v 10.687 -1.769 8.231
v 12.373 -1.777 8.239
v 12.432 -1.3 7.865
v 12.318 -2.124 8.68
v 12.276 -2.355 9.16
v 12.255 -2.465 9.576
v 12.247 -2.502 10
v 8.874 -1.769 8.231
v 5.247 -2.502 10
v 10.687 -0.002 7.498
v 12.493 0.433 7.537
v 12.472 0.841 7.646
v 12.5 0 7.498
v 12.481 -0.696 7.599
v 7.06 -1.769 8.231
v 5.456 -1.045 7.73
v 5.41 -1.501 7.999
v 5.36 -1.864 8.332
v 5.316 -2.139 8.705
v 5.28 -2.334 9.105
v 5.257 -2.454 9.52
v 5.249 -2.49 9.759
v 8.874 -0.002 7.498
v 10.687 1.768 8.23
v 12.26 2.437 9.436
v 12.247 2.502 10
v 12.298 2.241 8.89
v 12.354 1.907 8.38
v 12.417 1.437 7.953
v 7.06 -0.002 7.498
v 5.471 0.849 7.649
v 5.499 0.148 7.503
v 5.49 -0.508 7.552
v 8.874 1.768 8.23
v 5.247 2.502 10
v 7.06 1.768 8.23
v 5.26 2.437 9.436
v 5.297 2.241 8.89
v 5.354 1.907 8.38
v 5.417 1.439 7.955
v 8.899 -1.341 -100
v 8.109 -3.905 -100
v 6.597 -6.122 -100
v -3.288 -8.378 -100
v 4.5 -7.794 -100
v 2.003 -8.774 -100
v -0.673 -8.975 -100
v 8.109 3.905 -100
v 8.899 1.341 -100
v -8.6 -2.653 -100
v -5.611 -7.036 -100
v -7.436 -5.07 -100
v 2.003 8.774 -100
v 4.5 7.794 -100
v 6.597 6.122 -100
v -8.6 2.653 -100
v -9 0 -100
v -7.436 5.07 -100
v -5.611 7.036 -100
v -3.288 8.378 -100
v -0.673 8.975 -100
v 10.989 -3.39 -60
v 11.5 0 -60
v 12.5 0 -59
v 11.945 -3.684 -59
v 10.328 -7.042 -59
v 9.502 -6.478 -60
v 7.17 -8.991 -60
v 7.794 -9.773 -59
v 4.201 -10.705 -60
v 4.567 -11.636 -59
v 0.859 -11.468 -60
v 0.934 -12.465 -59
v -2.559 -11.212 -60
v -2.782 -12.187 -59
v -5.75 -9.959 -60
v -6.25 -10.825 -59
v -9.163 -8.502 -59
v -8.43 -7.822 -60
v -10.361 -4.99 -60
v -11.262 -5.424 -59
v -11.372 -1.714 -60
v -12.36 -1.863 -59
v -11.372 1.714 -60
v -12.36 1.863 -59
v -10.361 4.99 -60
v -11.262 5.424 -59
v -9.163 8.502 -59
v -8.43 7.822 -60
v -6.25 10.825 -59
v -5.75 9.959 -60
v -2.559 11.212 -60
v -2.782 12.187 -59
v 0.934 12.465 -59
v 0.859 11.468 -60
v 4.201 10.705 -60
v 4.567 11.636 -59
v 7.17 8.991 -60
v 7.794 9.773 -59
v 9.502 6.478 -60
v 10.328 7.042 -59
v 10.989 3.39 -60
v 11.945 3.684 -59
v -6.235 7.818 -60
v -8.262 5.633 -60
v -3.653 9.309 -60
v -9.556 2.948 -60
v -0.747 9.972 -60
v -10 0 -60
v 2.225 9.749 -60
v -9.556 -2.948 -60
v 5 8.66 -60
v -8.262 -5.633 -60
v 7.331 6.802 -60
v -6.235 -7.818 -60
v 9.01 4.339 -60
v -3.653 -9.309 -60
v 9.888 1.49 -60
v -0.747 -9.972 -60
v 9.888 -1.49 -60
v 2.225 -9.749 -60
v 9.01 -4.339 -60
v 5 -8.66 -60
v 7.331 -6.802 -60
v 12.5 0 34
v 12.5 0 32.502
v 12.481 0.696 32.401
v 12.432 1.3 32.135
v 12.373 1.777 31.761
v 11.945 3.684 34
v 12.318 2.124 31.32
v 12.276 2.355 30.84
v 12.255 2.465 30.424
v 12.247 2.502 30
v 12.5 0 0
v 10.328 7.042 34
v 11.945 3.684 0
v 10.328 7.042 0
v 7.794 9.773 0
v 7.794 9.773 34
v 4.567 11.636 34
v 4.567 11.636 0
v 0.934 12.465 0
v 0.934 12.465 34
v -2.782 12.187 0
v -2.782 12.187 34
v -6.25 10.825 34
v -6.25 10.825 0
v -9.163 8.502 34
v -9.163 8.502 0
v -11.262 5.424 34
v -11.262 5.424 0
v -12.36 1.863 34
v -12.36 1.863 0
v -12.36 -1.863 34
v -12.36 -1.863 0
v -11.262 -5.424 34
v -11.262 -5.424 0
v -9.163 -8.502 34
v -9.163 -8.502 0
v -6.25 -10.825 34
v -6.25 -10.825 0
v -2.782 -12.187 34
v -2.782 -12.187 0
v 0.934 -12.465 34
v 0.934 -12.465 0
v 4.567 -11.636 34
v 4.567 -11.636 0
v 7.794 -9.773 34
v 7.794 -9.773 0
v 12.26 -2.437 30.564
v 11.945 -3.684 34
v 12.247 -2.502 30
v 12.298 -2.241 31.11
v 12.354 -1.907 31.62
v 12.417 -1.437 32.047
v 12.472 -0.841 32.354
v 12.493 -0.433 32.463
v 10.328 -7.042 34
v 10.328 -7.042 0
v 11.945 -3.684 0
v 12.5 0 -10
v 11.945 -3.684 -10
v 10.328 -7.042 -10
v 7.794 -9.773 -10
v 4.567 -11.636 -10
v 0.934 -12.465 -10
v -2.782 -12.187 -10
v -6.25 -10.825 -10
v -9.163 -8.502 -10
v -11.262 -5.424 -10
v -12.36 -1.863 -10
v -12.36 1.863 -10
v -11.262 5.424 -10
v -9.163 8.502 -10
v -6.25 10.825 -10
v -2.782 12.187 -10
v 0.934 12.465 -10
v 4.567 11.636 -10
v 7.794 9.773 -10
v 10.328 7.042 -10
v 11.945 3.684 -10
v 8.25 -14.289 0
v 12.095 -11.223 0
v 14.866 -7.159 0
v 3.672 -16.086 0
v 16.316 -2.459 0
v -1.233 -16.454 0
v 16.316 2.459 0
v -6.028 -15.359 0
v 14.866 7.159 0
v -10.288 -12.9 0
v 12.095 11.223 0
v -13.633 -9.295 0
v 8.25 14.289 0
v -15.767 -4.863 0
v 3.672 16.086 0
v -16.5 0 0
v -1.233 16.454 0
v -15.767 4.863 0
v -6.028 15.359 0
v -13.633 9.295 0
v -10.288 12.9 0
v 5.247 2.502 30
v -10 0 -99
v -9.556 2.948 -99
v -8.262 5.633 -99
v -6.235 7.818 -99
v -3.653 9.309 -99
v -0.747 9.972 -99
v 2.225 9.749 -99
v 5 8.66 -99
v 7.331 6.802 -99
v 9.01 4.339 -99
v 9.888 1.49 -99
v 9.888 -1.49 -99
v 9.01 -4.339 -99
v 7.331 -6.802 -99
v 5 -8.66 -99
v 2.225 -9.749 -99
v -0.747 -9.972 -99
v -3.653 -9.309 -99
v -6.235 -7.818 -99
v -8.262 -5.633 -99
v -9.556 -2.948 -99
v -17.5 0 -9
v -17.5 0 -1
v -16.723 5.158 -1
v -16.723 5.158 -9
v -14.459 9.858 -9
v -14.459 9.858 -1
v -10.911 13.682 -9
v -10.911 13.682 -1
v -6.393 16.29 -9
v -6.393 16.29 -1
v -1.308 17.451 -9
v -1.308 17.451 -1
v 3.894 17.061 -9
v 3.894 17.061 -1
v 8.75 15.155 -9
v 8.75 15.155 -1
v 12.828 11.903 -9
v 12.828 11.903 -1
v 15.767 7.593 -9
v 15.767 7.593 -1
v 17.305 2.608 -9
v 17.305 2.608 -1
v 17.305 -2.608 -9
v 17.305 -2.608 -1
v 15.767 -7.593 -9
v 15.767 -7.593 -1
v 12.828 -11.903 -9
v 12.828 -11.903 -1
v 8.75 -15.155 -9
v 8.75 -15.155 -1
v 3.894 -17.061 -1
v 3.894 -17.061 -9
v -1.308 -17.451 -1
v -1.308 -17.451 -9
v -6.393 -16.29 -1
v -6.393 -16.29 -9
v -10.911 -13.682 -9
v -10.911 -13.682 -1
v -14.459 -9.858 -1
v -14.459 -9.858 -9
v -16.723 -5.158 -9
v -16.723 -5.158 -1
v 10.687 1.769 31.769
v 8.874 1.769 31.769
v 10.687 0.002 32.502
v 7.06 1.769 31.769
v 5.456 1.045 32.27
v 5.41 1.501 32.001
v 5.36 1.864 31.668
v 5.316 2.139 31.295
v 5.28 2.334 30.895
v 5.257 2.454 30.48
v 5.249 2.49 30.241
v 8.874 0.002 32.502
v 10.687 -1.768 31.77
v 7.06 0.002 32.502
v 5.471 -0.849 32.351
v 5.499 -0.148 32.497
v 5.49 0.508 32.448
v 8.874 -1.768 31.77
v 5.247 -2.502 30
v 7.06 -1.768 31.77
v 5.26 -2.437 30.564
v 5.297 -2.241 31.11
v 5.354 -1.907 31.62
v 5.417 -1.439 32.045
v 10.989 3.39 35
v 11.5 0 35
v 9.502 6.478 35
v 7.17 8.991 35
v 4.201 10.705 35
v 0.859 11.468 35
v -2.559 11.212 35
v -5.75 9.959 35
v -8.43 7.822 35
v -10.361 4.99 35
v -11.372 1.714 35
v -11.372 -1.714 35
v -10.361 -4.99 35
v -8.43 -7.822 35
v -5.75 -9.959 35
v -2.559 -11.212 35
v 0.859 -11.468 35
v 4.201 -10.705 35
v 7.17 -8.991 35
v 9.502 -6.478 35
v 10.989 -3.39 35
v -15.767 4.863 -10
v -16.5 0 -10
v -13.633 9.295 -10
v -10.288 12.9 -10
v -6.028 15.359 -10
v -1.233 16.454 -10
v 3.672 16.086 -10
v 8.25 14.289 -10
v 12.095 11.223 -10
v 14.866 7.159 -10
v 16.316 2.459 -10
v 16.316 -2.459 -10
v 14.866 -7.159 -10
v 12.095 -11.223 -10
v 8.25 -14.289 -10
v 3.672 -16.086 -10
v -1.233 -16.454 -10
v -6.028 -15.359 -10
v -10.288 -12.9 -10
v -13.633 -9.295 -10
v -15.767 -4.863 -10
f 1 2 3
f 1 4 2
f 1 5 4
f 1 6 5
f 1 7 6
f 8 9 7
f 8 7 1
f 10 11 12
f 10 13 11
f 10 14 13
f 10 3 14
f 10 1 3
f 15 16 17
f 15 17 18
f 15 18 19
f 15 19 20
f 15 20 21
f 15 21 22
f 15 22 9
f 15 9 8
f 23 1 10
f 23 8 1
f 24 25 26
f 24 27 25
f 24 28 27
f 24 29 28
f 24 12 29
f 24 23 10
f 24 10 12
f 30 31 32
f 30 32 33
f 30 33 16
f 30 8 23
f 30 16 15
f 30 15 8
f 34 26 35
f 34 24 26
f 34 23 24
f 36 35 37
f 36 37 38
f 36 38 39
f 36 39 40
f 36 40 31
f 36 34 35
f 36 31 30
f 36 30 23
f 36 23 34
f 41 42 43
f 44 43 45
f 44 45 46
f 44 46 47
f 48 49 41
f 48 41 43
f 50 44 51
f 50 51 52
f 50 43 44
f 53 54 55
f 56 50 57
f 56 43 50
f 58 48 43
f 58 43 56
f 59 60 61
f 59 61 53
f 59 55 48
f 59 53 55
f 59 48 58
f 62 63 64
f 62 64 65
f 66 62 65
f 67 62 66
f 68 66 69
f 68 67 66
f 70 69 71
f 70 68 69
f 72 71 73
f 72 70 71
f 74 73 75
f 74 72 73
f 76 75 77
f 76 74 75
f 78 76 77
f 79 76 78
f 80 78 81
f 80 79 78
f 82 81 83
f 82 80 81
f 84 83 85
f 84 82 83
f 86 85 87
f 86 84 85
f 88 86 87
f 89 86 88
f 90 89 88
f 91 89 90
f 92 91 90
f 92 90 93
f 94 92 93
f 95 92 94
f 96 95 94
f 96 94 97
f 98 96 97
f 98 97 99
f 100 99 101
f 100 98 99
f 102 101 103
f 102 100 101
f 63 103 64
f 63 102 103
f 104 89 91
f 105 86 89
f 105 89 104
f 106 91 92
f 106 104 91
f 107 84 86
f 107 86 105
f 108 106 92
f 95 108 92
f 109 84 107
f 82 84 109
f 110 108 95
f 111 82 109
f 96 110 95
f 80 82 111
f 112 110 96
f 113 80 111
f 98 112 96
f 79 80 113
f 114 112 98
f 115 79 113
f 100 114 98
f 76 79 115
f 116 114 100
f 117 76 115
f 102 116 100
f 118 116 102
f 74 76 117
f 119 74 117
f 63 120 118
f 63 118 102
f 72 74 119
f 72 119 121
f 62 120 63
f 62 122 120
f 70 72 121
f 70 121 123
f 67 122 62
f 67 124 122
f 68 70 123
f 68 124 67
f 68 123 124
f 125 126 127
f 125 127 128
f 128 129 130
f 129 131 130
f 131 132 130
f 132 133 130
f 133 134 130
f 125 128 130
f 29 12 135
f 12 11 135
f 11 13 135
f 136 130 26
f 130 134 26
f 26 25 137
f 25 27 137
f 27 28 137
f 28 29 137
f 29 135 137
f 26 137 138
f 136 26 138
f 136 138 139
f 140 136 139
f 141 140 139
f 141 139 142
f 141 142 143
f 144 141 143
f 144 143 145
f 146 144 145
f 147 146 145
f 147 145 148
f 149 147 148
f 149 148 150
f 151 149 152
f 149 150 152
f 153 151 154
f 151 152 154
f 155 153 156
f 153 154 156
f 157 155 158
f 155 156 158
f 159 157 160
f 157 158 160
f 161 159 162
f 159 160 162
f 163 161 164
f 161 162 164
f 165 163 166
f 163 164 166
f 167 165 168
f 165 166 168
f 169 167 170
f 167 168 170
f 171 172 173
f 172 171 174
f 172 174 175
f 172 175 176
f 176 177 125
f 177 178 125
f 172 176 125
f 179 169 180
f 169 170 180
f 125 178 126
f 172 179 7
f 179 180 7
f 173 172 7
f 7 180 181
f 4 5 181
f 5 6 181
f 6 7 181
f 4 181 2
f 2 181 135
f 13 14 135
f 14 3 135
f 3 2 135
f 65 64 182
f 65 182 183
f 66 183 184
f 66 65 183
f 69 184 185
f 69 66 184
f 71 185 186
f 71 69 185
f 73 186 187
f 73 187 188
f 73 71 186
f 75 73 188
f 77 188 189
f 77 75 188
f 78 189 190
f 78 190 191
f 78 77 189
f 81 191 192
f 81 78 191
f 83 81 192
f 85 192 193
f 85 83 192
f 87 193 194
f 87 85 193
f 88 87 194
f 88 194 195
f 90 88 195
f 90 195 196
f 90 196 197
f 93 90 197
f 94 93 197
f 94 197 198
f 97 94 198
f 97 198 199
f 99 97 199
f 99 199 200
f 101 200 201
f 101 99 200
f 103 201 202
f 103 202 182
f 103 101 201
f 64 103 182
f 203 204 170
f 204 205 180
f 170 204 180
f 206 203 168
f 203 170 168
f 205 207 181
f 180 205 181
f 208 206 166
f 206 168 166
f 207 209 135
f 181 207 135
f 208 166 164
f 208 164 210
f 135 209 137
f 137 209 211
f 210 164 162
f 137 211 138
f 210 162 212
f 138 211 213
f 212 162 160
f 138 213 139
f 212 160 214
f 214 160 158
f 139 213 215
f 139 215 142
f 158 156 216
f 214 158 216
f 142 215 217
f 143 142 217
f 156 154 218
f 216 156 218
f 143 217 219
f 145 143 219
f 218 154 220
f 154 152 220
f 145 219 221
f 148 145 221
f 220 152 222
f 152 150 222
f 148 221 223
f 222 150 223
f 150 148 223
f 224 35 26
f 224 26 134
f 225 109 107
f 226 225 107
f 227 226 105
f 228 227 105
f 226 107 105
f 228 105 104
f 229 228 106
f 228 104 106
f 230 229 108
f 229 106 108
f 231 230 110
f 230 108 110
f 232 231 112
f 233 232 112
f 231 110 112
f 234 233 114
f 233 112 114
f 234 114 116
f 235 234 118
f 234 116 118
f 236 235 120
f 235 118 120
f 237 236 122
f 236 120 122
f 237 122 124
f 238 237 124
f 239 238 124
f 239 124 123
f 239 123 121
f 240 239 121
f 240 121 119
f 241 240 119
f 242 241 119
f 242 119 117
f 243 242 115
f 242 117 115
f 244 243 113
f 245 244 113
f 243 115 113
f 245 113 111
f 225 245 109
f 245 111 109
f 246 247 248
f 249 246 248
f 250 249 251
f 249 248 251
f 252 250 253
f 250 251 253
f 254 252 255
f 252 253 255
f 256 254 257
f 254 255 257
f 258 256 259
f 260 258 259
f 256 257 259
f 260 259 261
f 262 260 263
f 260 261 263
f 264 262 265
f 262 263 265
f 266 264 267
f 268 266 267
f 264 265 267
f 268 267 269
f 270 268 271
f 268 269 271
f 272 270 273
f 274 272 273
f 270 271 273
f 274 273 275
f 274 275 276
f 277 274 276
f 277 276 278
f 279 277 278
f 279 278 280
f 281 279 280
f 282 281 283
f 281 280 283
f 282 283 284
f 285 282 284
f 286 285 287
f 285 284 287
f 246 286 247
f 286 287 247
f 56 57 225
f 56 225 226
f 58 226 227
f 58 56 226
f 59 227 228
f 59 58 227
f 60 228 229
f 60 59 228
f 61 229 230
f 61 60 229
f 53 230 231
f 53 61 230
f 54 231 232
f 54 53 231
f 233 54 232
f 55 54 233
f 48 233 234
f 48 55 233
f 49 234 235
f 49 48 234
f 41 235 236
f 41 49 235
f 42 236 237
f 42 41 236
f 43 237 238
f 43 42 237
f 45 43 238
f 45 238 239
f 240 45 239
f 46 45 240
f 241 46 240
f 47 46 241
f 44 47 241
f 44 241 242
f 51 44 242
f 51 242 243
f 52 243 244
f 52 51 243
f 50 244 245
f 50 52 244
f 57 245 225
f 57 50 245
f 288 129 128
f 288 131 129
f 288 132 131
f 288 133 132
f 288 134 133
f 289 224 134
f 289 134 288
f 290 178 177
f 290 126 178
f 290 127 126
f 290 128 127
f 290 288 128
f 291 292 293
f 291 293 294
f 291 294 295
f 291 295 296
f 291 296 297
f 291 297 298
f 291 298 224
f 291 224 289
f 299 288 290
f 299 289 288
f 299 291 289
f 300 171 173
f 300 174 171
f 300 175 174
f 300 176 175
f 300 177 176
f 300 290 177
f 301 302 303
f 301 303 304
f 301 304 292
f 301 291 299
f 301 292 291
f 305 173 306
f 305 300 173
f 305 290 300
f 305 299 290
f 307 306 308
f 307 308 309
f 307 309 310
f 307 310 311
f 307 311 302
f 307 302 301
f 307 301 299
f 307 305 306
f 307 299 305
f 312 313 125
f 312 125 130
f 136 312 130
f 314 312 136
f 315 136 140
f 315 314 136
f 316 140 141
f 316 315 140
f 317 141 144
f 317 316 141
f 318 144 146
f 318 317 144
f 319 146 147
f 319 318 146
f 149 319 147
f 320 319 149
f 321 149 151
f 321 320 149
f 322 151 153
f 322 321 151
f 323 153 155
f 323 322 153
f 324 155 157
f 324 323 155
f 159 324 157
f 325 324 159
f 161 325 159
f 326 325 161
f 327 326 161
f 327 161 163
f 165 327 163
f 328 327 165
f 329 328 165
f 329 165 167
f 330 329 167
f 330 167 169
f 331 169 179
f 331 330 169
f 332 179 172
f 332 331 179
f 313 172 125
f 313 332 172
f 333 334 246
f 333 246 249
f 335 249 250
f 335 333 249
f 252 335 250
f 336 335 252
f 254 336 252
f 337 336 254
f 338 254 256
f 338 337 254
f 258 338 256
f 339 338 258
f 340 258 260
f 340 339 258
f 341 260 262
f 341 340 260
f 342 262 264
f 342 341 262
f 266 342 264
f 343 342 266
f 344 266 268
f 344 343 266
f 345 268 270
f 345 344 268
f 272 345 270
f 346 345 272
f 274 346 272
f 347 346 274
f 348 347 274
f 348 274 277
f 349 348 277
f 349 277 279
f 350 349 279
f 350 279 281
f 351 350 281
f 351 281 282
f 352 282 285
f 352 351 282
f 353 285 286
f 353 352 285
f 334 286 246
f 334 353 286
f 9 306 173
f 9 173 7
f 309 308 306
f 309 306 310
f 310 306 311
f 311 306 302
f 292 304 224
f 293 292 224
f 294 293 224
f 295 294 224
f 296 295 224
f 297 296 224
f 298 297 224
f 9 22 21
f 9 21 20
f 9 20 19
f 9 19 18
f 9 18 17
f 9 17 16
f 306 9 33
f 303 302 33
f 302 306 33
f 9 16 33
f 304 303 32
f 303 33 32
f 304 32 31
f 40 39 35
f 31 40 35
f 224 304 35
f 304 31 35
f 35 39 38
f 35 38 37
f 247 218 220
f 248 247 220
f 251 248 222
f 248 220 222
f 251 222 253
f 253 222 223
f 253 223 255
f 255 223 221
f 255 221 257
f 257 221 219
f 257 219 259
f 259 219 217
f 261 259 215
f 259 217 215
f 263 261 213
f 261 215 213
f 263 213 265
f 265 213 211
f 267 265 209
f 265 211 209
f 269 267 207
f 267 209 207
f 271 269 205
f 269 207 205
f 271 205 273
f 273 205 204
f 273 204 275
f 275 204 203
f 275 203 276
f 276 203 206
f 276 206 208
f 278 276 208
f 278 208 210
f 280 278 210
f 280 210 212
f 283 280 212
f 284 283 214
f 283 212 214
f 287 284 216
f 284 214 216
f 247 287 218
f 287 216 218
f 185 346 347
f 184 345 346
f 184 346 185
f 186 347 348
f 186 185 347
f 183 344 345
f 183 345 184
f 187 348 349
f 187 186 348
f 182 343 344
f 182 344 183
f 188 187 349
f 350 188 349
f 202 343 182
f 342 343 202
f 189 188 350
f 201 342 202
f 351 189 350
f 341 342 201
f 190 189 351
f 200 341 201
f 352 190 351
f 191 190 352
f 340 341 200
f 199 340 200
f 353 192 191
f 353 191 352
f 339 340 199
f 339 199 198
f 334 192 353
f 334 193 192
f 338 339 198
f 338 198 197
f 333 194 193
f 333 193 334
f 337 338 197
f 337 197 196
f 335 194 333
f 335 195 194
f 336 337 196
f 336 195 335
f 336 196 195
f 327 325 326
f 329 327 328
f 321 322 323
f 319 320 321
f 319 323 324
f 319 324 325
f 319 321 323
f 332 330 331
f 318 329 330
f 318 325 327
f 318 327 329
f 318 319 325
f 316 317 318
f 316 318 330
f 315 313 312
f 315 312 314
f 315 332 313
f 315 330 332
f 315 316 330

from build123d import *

# Parameters (mm, degrees)
SKETCH1_R             = 12.5
BOSS_EXTRUDE2_DEPTH   = 35
SKETCH6_R             = 17.5
BOSS_EXTRUDE3_DEPTH   = 10
BOSS_EXTRUDE4_START   = 50
SKETCH7_R             = 12.5
BOSS_EXTRUDE4_DEPTH   = 50
SKETCH8_R             = 10
BOSS_EXTRUDE5_DEPTH   = 40
CHAMFER1_SIZE         = 1
CUT_EXTRUDE11_START   = 5.24705599
CUT_EXTRUDE11_DEPTH   = 8.75294401
CUT_EXTRUDE11_START_2 = 6
CUT_EXTRUDE11_2_DEPTH = 28


with BuildPart() as part:
    # Sketch1 → Boss-Extrude2 (new body)
    with BuildSketch(Plane.XY):
        Circle(SKETCH1_R)
    extrude(amount=BOSS_EXTRUDE2_DEPTH)

    # Sketch6 → Boss-Extrude3 (add)
    with BuildSketch(Plane(origin=(0, 0, 0), x_dir=(-1, 0, 0), z_dir=(0, 0, -1))):
        Circle(SKETCH6_R)
    extrude(amount=BOSS_EXTRUDE3_DEPTH)

    # Sketch7 → Boss-Extrude4 (add)
    with BuildSketch(Plane(origin=(0, 0, -10), x_dir=(-1, 0, 0), z_dir=(0, 0, -1)).offset(BOSS_EXTRUDE4_START)):
        with Locations(Location((0, 0, 0), (0, 0, 180))):
            Circle(SKETCH7_R)
    extrude(amount=-BOSS_EXTRUDE4_DEPTH)

    # Sketch8 → Boss-Extrude5 (add)
    with BuildSketch(Plane(origin=(0, 0, -60), x_dir=(-1, 0, 0), z_dir=(0, 0, -1))):
        Circle(SKETCH8_R)
    extrude(amount=BOSS_EXTRUDE5_DEPTH)

    # Chamfer1
    chamfer1_edges = [part.edges().sort_by_distance(p)[0] for p in [
        (-12.5, 0, -60),
        (10, 0, -100),
        (-12.5, 0, 35),
        (17.5, 0, 0),
        (17.5, 0, -10),
    ]]
    chamfer(chamfer1_edges, length=CHAMFER1_SIZE)

    # Cut-Extrude11: read off the stored shape, not the designer's step
    # Cut-Extrude11 outline → Cut-Extrude11 (cut)
    with BuildSketch(Plane(origin=(0, 0, 0), x_dir=(0, 0, -1), z_dir=(1, 0, 0)).offset(CUT_EXTRUDE11_START)):
        with BuildLine():
            Line((-10, 2.501922686), (-30, 2.501922686))
            add(Edge.make_bspline(
                [(-30, 2.501922686), (-30.662861656, 2.501922686), (-31.308912406, 2.229348378), (-32.229370531, 1.308874674), (-32.501390649, 0.6564432), (-32.502453075, -0.652381374), (-32.23483126, -1.302936015), (-31.305267278, -2.233470473), (-30.662865998, -2.501922686), (-30, -2.501922686)],
                knots=[0, 0, 0, 0, 0.25, 0.25, 0.5, 0.5, 0.75, 0.75, 1, 1, 1, 1], degree=3))
            Line((-30, -2.501922686), (-10, -2.501922686))
            add(Edge.make_bspline(
                [(-10, -2.501922686), (-9.337138344, -2.501922686), (-8.691087594, -2.229348378), (-7.770629469, -1.308874674), (-7.498609351, -0.6564432), (-7.497546925, 0.652381374), (-7.76516874, 1.302936015), (-8.694732722, 2.233470473), (-9.337134002, 2.501922686), (-10, 2.501922686)],
                knots=[0, 0, 0, 0, 0.25, 0.25, 0.5, 0.5, 0.75, 0.75, 1, 1, 1, 1], degree=3))
        make_face()
    extrude(amount=CUT_EXTRUDE11_DEPTH, mode=Mode.SUBTRACT)

    # Cut-Extrude11 2 outline → Cut-Extrude11 2 (add)
    with BuildSketch(Plane.XY.offset(CUT_EXTRUDE11_START_2)):
        with BuildLine():
            ThreePointArc((5.24705609, -2.501922686), (5.5, 0), (5.24705609, 2.501922686))
            Line((5.24705609, 2.501922686), (5.24705609, -2.501922686))
        make_face()
    extrude(amount=CUT_EXTRUDE11_2_DEPTH)


solid = part.part
